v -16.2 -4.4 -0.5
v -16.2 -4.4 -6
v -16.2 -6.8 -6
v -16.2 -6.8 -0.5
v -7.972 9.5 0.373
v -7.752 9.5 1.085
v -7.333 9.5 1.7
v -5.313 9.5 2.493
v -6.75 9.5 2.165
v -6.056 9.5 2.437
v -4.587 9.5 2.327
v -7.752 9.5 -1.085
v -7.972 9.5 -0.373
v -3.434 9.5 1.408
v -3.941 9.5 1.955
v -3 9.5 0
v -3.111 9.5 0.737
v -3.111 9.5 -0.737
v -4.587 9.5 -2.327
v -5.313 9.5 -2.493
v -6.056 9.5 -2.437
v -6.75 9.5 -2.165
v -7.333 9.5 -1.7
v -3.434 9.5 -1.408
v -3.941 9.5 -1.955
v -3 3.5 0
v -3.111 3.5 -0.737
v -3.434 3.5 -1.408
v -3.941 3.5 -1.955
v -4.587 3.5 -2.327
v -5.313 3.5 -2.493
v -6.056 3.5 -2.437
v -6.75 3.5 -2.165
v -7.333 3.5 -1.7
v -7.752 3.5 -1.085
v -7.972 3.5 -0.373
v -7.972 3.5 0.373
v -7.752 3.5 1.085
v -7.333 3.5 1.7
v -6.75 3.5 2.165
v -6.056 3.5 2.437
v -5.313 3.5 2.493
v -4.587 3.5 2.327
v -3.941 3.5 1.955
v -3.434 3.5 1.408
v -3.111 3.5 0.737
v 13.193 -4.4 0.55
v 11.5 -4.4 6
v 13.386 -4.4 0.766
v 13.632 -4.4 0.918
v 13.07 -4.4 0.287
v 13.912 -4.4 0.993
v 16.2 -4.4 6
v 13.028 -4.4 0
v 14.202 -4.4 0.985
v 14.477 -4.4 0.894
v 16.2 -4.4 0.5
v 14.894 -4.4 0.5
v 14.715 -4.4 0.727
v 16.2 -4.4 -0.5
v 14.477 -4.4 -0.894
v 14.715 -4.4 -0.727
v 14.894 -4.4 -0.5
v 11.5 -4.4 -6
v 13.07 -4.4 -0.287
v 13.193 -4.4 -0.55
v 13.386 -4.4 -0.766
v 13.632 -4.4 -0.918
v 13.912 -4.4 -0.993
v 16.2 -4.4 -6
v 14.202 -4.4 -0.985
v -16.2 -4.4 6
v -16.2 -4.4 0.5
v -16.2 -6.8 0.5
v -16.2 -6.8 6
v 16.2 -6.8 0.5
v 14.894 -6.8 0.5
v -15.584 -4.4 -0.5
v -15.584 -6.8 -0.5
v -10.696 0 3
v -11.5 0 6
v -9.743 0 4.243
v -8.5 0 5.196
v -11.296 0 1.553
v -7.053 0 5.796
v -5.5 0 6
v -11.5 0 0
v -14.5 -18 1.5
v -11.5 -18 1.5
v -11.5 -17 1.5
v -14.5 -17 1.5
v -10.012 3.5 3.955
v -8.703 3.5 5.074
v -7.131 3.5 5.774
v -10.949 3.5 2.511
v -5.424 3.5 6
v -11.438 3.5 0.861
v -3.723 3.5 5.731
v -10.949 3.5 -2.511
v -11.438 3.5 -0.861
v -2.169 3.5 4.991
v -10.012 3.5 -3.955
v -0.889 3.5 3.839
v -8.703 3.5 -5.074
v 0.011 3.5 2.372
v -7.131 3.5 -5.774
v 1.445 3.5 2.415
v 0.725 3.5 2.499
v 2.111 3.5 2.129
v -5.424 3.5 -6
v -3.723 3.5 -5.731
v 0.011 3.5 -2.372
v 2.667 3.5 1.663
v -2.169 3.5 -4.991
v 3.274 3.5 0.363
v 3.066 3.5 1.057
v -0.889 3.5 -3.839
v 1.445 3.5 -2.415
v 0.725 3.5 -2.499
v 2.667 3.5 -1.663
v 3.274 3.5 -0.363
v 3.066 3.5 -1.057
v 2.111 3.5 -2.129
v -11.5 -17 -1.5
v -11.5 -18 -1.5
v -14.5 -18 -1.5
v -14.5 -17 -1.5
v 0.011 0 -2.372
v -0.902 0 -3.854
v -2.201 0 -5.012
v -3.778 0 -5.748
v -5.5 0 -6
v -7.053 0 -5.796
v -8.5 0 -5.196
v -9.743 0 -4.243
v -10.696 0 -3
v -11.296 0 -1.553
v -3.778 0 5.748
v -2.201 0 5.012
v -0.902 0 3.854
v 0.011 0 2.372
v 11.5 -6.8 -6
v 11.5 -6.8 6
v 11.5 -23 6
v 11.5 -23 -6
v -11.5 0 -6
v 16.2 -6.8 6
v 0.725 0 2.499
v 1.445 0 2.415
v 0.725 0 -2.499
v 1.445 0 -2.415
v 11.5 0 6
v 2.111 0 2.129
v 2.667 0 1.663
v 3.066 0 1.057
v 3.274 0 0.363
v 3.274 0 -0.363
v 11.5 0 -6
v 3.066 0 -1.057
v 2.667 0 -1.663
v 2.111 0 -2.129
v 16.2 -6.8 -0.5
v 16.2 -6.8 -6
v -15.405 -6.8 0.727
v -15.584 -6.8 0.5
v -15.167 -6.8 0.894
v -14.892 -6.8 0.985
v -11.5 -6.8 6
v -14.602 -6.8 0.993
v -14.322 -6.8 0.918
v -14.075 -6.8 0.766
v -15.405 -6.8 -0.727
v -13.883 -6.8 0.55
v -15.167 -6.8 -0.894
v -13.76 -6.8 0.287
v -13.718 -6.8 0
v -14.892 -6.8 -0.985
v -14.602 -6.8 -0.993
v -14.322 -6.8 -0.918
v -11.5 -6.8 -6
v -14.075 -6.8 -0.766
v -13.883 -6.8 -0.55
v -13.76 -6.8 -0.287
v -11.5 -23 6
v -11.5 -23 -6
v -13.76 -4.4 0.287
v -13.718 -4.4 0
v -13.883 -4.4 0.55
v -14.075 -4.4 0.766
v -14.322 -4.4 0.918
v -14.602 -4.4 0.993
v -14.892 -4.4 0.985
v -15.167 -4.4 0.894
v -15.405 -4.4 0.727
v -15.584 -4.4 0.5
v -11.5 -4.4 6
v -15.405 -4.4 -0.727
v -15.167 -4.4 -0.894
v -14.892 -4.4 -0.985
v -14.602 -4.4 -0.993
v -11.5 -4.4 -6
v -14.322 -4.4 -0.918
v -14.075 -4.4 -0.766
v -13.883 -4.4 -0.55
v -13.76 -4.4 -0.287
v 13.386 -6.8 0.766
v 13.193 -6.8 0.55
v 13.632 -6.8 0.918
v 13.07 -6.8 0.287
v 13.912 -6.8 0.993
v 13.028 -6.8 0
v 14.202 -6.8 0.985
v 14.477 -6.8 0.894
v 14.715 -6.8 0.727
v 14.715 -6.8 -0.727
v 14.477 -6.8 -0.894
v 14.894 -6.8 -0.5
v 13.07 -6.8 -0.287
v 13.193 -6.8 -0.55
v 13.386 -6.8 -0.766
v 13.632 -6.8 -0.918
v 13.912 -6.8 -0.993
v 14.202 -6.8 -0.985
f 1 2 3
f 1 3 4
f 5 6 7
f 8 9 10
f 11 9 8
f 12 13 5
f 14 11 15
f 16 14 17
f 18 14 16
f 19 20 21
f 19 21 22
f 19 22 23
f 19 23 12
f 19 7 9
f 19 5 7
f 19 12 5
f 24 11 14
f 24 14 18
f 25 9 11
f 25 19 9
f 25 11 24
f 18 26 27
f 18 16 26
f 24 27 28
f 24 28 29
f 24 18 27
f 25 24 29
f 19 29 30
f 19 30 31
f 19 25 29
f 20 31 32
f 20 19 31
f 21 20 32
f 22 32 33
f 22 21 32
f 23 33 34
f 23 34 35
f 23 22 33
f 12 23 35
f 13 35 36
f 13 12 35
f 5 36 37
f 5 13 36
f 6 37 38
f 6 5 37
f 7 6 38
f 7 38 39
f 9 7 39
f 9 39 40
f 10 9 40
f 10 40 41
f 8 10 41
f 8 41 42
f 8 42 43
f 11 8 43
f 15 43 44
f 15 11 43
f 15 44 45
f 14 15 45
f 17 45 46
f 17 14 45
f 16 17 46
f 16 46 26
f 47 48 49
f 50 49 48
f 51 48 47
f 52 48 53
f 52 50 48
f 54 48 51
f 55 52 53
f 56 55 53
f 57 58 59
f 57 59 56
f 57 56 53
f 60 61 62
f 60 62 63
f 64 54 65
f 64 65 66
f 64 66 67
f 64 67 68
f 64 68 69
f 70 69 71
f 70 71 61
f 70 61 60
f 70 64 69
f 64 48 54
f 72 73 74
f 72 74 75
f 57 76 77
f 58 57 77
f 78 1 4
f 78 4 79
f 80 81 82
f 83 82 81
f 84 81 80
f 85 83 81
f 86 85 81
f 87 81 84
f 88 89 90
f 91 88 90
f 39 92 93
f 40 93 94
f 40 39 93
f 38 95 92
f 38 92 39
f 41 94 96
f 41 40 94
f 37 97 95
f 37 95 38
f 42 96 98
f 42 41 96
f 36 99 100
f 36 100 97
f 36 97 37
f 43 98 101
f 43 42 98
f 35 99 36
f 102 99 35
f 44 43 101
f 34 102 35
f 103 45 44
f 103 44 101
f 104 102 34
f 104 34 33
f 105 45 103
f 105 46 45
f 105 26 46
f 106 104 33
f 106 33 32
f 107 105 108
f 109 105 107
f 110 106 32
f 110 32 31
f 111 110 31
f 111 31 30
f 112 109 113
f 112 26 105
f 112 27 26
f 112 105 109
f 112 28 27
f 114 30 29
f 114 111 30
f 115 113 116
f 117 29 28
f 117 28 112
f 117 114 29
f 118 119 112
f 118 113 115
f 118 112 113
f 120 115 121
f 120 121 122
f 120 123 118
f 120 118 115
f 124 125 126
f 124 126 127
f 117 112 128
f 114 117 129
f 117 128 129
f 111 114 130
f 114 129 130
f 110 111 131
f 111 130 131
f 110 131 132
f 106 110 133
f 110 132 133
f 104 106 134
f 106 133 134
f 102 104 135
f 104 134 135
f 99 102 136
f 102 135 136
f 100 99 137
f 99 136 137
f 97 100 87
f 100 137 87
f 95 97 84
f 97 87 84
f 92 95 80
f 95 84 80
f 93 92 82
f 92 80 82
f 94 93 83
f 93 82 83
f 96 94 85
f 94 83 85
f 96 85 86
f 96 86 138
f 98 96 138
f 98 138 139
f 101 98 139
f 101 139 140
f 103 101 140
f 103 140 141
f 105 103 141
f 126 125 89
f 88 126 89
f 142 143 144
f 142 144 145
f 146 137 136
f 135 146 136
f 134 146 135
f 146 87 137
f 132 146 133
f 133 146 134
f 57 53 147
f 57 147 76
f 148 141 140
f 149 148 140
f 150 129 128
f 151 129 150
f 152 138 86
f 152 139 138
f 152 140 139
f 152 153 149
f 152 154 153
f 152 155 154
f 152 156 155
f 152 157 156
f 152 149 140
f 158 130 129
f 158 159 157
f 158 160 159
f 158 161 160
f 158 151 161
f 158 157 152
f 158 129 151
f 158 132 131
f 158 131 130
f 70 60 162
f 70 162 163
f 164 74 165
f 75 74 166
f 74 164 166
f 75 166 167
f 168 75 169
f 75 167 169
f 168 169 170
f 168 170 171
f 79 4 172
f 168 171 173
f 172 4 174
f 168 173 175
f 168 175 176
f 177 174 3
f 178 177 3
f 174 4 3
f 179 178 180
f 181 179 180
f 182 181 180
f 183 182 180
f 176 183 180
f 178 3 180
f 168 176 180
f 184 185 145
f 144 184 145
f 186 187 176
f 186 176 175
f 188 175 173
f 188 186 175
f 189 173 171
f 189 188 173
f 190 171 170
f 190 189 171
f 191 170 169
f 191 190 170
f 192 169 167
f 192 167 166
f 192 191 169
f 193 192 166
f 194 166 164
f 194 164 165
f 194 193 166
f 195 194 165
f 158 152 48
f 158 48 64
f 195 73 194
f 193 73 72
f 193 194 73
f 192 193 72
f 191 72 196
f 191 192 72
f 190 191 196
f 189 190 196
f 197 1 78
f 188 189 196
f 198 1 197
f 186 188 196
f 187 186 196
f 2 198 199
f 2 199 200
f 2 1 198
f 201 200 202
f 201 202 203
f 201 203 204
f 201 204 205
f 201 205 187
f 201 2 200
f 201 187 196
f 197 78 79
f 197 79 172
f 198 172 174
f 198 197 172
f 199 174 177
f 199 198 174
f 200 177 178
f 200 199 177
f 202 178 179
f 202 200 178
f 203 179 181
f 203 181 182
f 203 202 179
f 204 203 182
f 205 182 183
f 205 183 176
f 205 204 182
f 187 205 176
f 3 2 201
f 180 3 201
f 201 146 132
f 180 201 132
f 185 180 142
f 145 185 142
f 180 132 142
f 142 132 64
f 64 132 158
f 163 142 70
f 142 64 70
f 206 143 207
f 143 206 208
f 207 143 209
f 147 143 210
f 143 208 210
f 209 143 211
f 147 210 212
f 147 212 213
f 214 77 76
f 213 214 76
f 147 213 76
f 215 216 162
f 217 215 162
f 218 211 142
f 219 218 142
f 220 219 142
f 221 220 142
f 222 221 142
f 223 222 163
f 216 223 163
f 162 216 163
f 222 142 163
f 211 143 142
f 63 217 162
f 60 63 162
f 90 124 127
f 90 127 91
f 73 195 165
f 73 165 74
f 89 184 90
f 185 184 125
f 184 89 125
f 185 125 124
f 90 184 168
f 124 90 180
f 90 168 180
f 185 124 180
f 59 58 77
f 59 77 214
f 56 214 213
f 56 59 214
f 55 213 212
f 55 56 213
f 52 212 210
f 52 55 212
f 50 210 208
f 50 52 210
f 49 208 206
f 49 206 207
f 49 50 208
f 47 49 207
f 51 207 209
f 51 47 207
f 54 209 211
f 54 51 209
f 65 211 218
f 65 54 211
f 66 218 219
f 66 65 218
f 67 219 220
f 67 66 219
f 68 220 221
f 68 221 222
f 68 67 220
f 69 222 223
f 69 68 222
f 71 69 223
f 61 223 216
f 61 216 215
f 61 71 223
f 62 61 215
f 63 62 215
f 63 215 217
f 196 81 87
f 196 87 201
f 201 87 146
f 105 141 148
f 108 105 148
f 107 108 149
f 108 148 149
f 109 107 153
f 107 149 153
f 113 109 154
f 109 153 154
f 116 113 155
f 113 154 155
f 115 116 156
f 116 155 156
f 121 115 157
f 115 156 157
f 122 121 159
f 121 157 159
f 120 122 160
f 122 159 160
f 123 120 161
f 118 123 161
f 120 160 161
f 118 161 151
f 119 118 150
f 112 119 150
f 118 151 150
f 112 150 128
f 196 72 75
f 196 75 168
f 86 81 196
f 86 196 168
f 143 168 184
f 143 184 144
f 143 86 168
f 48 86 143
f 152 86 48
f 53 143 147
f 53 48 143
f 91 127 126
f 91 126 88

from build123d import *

# Parameters (mm, degrees)
SKETCH2_W           = 23
SKETCH2_H           = 12
BOSS_EXTRUDE1_DEPTH = 23
BOSS_EXTRUDE2_START = -4.4
BOSS_EXTRUDE2_DEPTH = 2.4
SKETCH4_R           = 6
SKETCH4_R_2         = 2.5
BOSS_EXTRUDE3_DEPTH = 3.5
BOSS_EXTRUDE4_DEPTH = 3
SKETCH6_W           = 3
SKETCH6_H           = 1
BOSS_EXTRUDE5_DEPTH = 3
SKETCH7_R           = 2.5
BOSS_EXTRUDE6_DEPTH = 3


with BuildPart() as part:
    # Sketch2 → Boss-Extrude1 (new body)
    with BuildSketch(Plane(origin=(0, 0, 0), x_dir=(1, 0, 0), z_dir=(0, 1, 0))):
        Rectangle(SKETCH2_W, SKETCH2_H)
    extrude(amount=-BOSS_EXTRUDE1_DEPTH)

    # Sketch3 → Boss-Extrude2 (add)
    with BuildSketch(Plane(origin=(0, 0, 0), x_dir=(1, 0, 0), z_dir=(0, 1, 0)).offset(BOSS_EXTRUDE2_START)):
        with BuildLine():
            Line((-16.2, -0.5), (-16.2, -6))
            Line((-16.2, -6), (-11.5, -6))
            Line((-11.5, -6), (-11.5, 6))
            Line((-11.5, 6), (-16.2, 6))
            Line((-16.2, 6), (-16.2, 0.5))
            Line((-16.2, 0.5), (-15.584293743, 0.5))
            ThreePointArc((-15.584293743, 0.5), (-14.459449294, 0.965925826), (-13.718268339, 0))
            ThreePointArc((-13.718268339, 0), (-14.459449294, -0.965925826), (-15.584293743, -0.5))
            Line((-15.584293743, -0.5), (-16.2, -0.5))
        make_face()
        with BuildLine():
            Line((11.5, 6), (11.5, -6))
            Line((11.5, -6), (16.2, -6))
            Line((16.2, -6), (16.2, -0.5))
            Line((16.2, -0.5), (14.894380034, -0.5))
            ThreePointArc((14.894380034, -0.5), (13.02835463, 0), (14.894380034, 0.5))
            Line((14.894380034, 0.5), (16.2, 0.5))
            Line((16.2, 0.5), (16.2, 6))
            Line((16.2, 6), (11.5, 6))
        make_face()
    extrude(amount=-BOSS_EXTRUDE2_DEPTH)

    # Sketch4 → Boss-Extrude3 (add)
    with BuildSketch(Plane(origin=(0, 0, 0), x_dir=(1, 0, 0), z_dir=(0, 1, 0))):
        with Locations((-5.5, 0)):
            Circle(SKETCH4_R)
        with Locations((0.8, 0)):
            Circle(SKETCH4_R_2)
    extrude(amount=BOSS_EXTRUDE3_DEPTH)

    # Sketch5 → Boss-Extrude4 (add)
    with BuildSketch(Plane(origin=(0, 3.5, 0), x_dir=(1, 0, 0), z_dir=(0, 1, 0))):
        Polygon((-3.255005568, -0.15), (-3.437184296, 0), (-3.255005568, 0.15), (-3.455589794, 0.274946425), (-3.295142762, 0.44844683), (-3.51047784, 0.544986424), (-3.374587739, 0.738324266), (-3.600868956, 0.805301127), (-3.491960749, 1.015026288), (-3.725150111, 1.051245213), (-3.645167266, 1.273615142), (-3.881103504, 1.278429803), (-3.831473318, 1.509476304), (-4.065946143, 1.482800783), (-4.047554268, 1.718400825), (-4.276379508, 1.660711148), (-4.289554146, 1.896660443), (-4.508648409, 1.808986083), (-4.553154459, 2.04107411), (-4.758608002, 1.924979619), (-4.833651254, 2.149064761), (-5.021797754, 2.006621847), (-5.126039057, 2.218705301), (-5.293521035, 2.052455862), (-5.425100203, 2.248752992), (-5.568928939, 2.061663752), (-5.725497937, 2.238671633), (-5.843106805, 2.034081205), (-6.021871655, 2.188641125), (-6.111161921, 1.97020043), (-6.308932561, 2.099554265), (-6.368310838, 1.871161381), (-6.581558046, 1.973000809), (-6.609964728, 1.738731414), (-6.834883102, 1.811239107), (-6.831811271, 1.575273743), (-7.064387138, 1.6171558), (-7.02989161, 1.383705275), (-7.265974648, 1.39421431), (-7.200670997, 1.167444554), (-7.436048299, 1.146393032), (-7.34110187, 0.930350756), (-7.571573122, 0.878114343), (-7.448678237, 0.676654828), (-7.670130674, 0.594165683), (-7.521480394, 0.410883978), (-7.729962192, 0.299614123), (-7.558209186, 0.137780894), (-7.749999982, -0.000284059), (-7.558209186, -0.137780894), (-7.729886469, -0.300177172), (-7.521480394, -0.410883978), (-7.669980579, -0.594713616), (-7.448678237, -0.676654828), (-7.571351335, -0.878637381), (-7.34110187, -0.930350756), (-7.435758777, -1.146881842), (-7.200670997, -1.167444554), (-7.265622557, -1.394660168), (-7.02989161, -1.383705275), (-7.063978761, -1.617550752), (-6.831811271, -1.575273743), (-6.834425728, -1.811576103), (-6.609964728, -1.738731414), (-6.581059835, -1.973273836), (-6.368310838, -1.871161381), (-6.308402404, -2.099758451), (-6.111161921, -1.97020043), (-6.021319013, -2.188772827), (-5.843106805, -2.034081205), (-5.724932672, -2.238728499), (-5.568928939, -2.061663752), (-5.424532402, -2.248734009), (-5.293521035, -2.052455862), (-5.125478853, -2.218610806), (-5.021797754, -2.006621847), (-4.833108643, -2.148896442), (-4.758608002, -1.924979619), (-4.552639125, -2.040834969), (-4.508648409, -1.808986083), (-4.289075284, -1.896354748), (-4.276379508, -1.660711148), (-4.047120423, -1.718034032), (-4.065946143, -1.482800783), (-3.831092233, -1.509054958), (-3.881103504, -1.278429803), (-3.644845742, -1.273146762), (-3.725150111, -1.051245213), (-3.491704522, -1.014519232), (-3.600868956, -0.805301127), (-3.374401382, -0.737787582), (-3.51047784, -0.544986424), (-3.295029601, -0.447890096), (-3.455589794, -0.274946425), align=None)
    extrude(amount=BOSS_EXTRUDE4_DEPTH)

    # Sketch6 → Boss-Extrude5 (add)
    with BuildSketch(Plane.ZY.offset(11.5)):
        with Locations((0, -17.5)):
            Rectangle(SKETCH6_W, SKETCH6_H)
    extrude(amount=BOSS_EXTRUDE5_DEPTH)

    # Sketch7 → Boss-Extrude6 (add, symmetric)
    with BuildSketch(Plane(origin=(0, 6.5, 0), x_dir=(1, 0, 0), z_dir=(0, 1, 0))):
        with Locations((-5.5, 0)):
            Circle(SKETCH7_R)
    extrude(amount=BOSS_EXTRUDE6_DEPTH, both=True)


solid = part.part
